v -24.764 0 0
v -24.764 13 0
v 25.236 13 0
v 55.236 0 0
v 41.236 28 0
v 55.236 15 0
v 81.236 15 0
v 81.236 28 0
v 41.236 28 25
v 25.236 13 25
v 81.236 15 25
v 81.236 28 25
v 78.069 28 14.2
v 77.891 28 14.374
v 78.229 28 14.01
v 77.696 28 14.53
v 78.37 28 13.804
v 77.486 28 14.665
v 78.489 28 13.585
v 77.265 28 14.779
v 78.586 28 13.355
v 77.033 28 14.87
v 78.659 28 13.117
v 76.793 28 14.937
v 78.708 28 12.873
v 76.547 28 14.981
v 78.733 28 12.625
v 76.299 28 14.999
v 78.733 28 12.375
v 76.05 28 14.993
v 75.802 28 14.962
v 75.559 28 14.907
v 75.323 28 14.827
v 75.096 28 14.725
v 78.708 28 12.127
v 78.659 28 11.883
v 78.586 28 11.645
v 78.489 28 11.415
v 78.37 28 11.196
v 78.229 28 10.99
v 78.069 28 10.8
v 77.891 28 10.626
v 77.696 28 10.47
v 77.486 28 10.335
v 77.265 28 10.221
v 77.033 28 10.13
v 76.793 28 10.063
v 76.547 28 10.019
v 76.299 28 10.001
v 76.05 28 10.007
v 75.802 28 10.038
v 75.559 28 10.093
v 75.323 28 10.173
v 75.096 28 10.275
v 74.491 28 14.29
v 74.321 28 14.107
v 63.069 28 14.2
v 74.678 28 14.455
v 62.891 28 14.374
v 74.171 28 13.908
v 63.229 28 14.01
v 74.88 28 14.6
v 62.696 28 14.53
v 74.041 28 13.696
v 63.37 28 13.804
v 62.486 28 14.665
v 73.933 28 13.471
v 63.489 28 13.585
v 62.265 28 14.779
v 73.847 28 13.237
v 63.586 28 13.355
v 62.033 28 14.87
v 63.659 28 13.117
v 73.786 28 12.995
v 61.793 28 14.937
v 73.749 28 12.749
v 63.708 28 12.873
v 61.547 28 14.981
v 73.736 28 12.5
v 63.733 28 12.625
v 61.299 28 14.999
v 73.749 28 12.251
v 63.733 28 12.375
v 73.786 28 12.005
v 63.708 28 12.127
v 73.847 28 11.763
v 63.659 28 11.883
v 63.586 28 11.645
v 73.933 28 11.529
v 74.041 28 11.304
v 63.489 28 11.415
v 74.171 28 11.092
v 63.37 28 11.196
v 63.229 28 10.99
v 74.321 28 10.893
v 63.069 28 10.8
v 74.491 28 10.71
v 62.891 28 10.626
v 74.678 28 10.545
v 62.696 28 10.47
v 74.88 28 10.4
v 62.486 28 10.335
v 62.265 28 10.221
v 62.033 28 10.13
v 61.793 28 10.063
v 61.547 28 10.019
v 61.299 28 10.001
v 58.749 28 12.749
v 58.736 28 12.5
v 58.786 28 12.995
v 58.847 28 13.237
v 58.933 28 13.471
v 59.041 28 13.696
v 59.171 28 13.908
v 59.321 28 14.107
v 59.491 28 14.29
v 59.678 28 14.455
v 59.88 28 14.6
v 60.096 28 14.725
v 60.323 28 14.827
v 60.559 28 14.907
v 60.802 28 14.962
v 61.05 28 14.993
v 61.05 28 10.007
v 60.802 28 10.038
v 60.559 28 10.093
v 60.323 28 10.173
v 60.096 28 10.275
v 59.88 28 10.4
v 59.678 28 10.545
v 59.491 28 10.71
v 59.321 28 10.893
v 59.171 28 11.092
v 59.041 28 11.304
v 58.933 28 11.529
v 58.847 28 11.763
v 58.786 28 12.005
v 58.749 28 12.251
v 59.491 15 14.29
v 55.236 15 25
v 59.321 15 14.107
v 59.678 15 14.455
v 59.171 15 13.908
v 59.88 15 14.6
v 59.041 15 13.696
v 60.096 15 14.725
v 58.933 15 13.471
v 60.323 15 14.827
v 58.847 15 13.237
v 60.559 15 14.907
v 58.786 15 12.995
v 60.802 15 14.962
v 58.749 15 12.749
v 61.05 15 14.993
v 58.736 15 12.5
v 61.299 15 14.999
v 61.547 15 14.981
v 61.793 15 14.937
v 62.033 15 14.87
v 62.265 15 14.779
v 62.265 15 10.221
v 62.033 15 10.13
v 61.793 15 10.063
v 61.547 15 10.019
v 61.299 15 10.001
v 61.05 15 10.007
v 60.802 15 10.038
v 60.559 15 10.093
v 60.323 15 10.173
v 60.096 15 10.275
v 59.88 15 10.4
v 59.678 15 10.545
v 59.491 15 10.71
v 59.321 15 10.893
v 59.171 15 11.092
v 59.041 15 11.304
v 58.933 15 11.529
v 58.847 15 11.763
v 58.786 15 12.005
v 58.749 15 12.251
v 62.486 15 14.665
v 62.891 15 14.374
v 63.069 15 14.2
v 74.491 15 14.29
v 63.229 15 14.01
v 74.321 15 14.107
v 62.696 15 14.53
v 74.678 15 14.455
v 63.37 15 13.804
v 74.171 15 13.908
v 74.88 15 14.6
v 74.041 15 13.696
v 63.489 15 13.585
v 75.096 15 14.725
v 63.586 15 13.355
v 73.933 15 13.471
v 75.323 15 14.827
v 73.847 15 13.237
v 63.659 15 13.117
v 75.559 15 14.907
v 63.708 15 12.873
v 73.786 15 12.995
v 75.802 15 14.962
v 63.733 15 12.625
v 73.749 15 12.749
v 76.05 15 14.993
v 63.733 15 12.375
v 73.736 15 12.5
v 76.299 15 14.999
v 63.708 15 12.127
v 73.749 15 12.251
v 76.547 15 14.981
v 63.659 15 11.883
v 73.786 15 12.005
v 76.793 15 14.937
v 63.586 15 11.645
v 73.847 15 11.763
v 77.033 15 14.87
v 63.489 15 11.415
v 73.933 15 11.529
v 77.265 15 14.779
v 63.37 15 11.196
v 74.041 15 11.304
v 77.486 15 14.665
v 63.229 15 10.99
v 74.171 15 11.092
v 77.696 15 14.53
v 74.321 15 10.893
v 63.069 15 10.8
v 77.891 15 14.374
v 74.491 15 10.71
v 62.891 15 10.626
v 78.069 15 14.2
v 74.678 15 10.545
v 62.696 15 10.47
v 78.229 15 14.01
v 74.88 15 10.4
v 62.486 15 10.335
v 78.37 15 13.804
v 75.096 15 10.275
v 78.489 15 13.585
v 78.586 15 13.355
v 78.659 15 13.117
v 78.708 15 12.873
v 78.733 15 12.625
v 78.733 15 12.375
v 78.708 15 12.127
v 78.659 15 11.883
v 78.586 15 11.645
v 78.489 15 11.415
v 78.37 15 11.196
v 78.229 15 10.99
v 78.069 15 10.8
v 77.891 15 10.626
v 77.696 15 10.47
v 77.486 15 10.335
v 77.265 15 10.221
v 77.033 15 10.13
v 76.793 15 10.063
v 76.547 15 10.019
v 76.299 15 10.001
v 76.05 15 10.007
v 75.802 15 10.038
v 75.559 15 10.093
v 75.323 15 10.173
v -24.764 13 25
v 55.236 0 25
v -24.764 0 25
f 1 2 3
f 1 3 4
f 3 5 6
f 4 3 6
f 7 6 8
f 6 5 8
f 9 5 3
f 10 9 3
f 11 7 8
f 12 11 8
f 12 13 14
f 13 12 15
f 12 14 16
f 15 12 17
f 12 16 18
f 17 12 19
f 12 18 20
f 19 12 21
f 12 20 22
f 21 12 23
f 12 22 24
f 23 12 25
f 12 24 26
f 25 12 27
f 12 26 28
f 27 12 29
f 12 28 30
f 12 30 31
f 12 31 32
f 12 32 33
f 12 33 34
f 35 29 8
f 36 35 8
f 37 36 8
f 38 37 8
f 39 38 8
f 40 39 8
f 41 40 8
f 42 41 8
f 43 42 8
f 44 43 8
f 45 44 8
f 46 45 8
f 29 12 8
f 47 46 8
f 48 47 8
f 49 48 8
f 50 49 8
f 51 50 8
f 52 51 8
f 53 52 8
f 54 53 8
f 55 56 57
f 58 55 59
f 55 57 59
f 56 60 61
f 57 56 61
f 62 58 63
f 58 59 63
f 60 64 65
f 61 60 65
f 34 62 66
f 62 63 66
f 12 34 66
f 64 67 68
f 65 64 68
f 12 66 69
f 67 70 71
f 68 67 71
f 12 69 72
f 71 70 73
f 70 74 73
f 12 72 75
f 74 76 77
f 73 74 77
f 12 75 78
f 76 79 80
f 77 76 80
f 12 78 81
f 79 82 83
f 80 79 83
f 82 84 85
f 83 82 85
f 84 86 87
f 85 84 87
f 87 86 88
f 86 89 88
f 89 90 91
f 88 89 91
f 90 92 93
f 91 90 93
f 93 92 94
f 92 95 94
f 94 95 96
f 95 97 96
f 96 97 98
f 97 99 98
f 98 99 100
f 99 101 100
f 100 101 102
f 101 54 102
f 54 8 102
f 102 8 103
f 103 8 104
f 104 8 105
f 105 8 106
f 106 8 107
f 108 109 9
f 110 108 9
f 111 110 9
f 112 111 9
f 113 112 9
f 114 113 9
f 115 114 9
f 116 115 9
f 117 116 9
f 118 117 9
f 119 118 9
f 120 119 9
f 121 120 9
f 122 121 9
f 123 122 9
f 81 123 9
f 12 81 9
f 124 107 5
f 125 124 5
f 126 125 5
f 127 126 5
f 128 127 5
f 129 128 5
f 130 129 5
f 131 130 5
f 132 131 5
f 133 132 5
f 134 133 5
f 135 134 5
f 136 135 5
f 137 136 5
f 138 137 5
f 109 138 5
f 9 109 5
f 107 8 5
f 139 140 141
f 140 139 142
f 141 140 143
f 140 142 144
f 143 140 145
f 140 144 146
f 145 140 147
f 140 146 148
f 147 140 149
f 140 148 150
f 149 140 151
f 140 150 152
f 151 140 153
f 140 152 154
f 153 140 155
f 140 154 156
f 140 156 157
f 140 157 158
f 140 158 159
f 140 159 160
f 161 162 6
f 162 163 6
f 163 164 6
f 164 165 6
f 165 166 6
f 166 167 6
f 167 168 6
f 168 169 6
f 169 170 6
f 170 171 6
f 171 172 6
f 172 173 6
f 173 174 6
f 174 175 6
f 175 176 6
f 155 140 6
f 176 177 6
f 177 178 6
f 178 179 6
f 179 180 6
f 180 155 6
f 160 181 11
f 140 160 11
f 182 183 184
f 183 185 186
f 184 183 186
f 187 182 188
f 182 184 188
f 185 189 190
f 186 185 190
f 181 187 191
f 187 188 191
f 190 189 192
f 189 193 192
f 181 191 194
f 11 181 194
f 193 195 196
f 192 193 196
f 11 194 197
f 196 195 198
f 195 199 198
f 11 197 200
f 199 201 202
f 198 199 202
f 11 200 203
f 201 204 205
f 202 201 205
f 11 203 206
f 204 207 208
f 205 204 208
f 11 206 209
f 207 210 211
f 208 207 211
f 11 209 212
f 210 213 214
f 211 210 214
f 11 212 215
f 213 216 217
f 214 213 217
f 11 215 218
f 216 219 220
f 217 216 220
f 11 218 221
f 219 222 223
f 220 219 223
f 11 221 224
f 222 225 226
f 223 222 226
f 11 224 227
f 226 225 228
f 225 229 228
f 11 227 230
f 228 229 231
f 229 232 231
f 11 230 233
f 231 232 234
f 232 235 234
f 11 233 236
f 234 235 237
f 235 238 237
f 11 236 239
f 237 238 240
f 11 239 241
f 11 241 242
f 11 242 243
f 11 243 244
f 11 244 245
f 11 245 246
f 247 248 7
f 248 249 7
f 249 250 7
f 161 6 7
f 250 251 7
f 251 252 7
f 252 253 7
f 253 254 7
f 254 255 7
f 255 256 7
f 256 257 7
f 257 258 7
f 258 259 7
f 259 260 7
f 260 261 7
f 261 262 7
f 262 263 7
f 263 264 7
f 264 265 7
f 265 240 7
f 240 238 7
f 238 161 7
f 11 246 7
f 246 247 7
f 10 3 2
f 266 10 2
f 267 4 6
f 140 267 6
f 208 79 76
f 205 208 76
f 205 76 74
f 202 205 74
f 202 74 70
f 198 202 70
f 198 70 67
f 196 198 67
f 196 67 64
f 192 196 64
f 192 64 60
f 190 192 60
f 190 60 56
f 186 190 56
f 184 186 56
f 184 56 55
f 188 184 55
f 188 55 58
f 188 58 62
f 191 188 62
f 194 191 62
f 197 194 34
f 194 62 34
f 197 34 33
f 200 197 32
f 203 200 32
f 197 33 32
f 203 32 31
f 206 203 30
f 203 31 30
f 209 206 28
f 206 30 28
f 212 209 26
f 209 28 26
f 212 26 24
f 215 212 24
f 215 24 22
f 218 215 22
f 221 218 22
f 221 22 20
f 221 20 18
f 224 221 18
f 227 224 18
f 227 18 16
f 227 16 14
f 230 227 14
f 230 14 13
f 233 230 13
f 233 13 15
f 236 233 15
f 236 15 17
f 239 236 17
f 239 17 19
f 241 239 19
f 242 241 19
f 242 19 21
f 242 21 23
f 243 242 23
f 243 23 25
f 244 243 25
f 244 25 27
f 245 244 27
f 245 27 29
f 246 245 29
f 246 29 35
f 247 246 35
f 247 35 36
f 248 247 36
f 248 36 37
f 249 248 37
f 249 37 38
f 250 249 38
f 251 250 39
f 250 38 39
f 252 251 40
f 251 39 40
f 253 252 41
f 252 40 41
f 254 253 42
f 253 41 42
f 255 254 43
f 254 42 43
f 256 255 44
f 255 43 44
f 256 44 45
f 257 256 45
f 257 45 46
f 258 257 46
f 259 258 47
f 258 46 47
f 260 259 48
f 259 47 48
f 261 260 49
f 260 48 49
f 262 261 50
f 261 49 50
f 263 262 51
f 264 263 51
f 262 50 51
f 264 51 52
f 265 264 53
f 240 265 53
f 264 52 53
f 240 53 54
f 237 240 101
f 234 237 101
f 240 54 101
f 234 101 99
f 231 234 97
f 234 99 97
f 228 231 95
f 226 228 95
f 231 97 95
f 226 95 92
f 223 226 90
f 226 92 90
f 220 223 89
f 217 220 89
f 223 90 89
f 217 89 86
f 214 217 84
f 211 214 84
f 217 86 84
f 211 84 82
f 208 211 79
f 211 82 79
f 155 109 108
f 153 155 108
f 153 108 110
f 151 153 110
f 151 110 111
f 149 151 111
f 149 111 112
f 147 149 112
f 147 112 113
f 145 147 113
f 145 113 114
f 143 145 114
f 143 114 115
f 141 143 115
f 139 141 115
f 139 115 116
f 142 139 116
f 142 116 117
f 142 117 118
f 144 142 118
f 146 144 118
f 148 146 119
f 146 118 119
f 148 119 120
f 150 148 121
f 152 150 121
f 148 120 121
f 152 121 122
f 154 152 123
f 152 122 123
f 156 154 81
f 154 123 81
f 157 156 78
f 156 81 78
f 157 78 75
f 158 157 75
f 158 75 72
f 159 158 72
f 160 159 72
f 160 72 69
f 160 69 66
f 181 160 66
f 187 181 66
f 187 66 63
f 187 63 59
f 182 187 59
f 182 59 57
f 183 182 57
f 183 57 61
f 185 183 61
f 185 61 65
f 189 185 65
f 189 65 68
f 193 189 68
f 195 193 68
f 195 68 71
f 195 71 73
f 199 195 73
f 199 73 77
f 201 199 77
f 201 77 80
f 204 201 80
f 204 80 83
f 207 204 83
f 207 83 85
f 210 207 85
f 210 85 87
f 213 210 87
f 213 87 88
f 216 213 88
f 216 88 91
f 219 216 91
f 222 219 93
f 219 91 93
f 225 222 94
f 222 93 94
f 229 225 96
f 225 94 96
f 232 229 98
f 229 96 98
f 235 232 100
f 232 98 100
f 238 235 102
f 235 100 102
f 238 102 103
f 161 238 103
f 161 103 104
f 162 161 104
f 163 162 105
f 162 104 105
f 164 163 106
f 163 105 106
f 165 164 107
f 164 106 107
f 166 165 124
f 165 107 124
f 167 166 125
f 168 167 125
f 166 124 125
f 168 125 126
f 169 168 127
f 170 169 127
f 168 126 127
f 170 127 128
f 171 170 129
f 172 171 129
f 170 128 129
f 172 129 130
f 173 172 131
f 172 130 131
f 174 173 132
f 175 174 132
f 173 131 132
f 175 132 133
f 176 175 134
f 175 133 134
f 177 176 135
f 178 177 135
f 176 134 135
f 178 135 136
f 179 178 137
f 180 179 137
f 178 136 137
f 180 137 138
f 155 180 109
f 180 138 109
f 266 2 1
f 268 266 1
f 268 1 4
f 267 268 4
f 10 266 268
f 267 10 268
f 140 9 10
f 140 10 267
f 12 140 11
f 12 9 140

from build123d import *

# Parameters (mm, degrees)
BOSS_EXTRUDE1_DEPTH = 25
SKETCH2_R           = 2.5
CUT_EXTRUDE1_DEPTH  = 90.489411687


with BuildPart() as part:
    # Sketch1 → Boss-Extrude1 (new body)
    with BuildSketch(Plane.XY):
        Polygon((0, 0), (55.236413043, 0), (55.236413043, 15), (81.236413043, 15), (81.236413043, 28), (41.236413043, 28), (25.236413043, 13), (-24.763586957, 13), (-24.763586957, 0), align=None)
    extrude(amount=BOSS_EXTRUDE1_DEPTH)

    # Sketch2 → Cut-Extrude1 (cut, through all)
    with BuildSketch(Plane(origin=(0, 28, 0), x_dir=(1, 0, 0), z_dir=(0, 1, 0))):
        with Locations(Location((76.236413043, -12.5, 0), (0, 0, 180))):
            Circle(SKETCH2_R)
        with Locations(Location((61.236413043, -12.5, 0), (0, 0, 180))):
            Circle(SKETCH2_R)
    extrude(amount=-CUT_EXTRUDE1_DEPTH, mode=Mode.SUBTRACT)


solid = part.part
